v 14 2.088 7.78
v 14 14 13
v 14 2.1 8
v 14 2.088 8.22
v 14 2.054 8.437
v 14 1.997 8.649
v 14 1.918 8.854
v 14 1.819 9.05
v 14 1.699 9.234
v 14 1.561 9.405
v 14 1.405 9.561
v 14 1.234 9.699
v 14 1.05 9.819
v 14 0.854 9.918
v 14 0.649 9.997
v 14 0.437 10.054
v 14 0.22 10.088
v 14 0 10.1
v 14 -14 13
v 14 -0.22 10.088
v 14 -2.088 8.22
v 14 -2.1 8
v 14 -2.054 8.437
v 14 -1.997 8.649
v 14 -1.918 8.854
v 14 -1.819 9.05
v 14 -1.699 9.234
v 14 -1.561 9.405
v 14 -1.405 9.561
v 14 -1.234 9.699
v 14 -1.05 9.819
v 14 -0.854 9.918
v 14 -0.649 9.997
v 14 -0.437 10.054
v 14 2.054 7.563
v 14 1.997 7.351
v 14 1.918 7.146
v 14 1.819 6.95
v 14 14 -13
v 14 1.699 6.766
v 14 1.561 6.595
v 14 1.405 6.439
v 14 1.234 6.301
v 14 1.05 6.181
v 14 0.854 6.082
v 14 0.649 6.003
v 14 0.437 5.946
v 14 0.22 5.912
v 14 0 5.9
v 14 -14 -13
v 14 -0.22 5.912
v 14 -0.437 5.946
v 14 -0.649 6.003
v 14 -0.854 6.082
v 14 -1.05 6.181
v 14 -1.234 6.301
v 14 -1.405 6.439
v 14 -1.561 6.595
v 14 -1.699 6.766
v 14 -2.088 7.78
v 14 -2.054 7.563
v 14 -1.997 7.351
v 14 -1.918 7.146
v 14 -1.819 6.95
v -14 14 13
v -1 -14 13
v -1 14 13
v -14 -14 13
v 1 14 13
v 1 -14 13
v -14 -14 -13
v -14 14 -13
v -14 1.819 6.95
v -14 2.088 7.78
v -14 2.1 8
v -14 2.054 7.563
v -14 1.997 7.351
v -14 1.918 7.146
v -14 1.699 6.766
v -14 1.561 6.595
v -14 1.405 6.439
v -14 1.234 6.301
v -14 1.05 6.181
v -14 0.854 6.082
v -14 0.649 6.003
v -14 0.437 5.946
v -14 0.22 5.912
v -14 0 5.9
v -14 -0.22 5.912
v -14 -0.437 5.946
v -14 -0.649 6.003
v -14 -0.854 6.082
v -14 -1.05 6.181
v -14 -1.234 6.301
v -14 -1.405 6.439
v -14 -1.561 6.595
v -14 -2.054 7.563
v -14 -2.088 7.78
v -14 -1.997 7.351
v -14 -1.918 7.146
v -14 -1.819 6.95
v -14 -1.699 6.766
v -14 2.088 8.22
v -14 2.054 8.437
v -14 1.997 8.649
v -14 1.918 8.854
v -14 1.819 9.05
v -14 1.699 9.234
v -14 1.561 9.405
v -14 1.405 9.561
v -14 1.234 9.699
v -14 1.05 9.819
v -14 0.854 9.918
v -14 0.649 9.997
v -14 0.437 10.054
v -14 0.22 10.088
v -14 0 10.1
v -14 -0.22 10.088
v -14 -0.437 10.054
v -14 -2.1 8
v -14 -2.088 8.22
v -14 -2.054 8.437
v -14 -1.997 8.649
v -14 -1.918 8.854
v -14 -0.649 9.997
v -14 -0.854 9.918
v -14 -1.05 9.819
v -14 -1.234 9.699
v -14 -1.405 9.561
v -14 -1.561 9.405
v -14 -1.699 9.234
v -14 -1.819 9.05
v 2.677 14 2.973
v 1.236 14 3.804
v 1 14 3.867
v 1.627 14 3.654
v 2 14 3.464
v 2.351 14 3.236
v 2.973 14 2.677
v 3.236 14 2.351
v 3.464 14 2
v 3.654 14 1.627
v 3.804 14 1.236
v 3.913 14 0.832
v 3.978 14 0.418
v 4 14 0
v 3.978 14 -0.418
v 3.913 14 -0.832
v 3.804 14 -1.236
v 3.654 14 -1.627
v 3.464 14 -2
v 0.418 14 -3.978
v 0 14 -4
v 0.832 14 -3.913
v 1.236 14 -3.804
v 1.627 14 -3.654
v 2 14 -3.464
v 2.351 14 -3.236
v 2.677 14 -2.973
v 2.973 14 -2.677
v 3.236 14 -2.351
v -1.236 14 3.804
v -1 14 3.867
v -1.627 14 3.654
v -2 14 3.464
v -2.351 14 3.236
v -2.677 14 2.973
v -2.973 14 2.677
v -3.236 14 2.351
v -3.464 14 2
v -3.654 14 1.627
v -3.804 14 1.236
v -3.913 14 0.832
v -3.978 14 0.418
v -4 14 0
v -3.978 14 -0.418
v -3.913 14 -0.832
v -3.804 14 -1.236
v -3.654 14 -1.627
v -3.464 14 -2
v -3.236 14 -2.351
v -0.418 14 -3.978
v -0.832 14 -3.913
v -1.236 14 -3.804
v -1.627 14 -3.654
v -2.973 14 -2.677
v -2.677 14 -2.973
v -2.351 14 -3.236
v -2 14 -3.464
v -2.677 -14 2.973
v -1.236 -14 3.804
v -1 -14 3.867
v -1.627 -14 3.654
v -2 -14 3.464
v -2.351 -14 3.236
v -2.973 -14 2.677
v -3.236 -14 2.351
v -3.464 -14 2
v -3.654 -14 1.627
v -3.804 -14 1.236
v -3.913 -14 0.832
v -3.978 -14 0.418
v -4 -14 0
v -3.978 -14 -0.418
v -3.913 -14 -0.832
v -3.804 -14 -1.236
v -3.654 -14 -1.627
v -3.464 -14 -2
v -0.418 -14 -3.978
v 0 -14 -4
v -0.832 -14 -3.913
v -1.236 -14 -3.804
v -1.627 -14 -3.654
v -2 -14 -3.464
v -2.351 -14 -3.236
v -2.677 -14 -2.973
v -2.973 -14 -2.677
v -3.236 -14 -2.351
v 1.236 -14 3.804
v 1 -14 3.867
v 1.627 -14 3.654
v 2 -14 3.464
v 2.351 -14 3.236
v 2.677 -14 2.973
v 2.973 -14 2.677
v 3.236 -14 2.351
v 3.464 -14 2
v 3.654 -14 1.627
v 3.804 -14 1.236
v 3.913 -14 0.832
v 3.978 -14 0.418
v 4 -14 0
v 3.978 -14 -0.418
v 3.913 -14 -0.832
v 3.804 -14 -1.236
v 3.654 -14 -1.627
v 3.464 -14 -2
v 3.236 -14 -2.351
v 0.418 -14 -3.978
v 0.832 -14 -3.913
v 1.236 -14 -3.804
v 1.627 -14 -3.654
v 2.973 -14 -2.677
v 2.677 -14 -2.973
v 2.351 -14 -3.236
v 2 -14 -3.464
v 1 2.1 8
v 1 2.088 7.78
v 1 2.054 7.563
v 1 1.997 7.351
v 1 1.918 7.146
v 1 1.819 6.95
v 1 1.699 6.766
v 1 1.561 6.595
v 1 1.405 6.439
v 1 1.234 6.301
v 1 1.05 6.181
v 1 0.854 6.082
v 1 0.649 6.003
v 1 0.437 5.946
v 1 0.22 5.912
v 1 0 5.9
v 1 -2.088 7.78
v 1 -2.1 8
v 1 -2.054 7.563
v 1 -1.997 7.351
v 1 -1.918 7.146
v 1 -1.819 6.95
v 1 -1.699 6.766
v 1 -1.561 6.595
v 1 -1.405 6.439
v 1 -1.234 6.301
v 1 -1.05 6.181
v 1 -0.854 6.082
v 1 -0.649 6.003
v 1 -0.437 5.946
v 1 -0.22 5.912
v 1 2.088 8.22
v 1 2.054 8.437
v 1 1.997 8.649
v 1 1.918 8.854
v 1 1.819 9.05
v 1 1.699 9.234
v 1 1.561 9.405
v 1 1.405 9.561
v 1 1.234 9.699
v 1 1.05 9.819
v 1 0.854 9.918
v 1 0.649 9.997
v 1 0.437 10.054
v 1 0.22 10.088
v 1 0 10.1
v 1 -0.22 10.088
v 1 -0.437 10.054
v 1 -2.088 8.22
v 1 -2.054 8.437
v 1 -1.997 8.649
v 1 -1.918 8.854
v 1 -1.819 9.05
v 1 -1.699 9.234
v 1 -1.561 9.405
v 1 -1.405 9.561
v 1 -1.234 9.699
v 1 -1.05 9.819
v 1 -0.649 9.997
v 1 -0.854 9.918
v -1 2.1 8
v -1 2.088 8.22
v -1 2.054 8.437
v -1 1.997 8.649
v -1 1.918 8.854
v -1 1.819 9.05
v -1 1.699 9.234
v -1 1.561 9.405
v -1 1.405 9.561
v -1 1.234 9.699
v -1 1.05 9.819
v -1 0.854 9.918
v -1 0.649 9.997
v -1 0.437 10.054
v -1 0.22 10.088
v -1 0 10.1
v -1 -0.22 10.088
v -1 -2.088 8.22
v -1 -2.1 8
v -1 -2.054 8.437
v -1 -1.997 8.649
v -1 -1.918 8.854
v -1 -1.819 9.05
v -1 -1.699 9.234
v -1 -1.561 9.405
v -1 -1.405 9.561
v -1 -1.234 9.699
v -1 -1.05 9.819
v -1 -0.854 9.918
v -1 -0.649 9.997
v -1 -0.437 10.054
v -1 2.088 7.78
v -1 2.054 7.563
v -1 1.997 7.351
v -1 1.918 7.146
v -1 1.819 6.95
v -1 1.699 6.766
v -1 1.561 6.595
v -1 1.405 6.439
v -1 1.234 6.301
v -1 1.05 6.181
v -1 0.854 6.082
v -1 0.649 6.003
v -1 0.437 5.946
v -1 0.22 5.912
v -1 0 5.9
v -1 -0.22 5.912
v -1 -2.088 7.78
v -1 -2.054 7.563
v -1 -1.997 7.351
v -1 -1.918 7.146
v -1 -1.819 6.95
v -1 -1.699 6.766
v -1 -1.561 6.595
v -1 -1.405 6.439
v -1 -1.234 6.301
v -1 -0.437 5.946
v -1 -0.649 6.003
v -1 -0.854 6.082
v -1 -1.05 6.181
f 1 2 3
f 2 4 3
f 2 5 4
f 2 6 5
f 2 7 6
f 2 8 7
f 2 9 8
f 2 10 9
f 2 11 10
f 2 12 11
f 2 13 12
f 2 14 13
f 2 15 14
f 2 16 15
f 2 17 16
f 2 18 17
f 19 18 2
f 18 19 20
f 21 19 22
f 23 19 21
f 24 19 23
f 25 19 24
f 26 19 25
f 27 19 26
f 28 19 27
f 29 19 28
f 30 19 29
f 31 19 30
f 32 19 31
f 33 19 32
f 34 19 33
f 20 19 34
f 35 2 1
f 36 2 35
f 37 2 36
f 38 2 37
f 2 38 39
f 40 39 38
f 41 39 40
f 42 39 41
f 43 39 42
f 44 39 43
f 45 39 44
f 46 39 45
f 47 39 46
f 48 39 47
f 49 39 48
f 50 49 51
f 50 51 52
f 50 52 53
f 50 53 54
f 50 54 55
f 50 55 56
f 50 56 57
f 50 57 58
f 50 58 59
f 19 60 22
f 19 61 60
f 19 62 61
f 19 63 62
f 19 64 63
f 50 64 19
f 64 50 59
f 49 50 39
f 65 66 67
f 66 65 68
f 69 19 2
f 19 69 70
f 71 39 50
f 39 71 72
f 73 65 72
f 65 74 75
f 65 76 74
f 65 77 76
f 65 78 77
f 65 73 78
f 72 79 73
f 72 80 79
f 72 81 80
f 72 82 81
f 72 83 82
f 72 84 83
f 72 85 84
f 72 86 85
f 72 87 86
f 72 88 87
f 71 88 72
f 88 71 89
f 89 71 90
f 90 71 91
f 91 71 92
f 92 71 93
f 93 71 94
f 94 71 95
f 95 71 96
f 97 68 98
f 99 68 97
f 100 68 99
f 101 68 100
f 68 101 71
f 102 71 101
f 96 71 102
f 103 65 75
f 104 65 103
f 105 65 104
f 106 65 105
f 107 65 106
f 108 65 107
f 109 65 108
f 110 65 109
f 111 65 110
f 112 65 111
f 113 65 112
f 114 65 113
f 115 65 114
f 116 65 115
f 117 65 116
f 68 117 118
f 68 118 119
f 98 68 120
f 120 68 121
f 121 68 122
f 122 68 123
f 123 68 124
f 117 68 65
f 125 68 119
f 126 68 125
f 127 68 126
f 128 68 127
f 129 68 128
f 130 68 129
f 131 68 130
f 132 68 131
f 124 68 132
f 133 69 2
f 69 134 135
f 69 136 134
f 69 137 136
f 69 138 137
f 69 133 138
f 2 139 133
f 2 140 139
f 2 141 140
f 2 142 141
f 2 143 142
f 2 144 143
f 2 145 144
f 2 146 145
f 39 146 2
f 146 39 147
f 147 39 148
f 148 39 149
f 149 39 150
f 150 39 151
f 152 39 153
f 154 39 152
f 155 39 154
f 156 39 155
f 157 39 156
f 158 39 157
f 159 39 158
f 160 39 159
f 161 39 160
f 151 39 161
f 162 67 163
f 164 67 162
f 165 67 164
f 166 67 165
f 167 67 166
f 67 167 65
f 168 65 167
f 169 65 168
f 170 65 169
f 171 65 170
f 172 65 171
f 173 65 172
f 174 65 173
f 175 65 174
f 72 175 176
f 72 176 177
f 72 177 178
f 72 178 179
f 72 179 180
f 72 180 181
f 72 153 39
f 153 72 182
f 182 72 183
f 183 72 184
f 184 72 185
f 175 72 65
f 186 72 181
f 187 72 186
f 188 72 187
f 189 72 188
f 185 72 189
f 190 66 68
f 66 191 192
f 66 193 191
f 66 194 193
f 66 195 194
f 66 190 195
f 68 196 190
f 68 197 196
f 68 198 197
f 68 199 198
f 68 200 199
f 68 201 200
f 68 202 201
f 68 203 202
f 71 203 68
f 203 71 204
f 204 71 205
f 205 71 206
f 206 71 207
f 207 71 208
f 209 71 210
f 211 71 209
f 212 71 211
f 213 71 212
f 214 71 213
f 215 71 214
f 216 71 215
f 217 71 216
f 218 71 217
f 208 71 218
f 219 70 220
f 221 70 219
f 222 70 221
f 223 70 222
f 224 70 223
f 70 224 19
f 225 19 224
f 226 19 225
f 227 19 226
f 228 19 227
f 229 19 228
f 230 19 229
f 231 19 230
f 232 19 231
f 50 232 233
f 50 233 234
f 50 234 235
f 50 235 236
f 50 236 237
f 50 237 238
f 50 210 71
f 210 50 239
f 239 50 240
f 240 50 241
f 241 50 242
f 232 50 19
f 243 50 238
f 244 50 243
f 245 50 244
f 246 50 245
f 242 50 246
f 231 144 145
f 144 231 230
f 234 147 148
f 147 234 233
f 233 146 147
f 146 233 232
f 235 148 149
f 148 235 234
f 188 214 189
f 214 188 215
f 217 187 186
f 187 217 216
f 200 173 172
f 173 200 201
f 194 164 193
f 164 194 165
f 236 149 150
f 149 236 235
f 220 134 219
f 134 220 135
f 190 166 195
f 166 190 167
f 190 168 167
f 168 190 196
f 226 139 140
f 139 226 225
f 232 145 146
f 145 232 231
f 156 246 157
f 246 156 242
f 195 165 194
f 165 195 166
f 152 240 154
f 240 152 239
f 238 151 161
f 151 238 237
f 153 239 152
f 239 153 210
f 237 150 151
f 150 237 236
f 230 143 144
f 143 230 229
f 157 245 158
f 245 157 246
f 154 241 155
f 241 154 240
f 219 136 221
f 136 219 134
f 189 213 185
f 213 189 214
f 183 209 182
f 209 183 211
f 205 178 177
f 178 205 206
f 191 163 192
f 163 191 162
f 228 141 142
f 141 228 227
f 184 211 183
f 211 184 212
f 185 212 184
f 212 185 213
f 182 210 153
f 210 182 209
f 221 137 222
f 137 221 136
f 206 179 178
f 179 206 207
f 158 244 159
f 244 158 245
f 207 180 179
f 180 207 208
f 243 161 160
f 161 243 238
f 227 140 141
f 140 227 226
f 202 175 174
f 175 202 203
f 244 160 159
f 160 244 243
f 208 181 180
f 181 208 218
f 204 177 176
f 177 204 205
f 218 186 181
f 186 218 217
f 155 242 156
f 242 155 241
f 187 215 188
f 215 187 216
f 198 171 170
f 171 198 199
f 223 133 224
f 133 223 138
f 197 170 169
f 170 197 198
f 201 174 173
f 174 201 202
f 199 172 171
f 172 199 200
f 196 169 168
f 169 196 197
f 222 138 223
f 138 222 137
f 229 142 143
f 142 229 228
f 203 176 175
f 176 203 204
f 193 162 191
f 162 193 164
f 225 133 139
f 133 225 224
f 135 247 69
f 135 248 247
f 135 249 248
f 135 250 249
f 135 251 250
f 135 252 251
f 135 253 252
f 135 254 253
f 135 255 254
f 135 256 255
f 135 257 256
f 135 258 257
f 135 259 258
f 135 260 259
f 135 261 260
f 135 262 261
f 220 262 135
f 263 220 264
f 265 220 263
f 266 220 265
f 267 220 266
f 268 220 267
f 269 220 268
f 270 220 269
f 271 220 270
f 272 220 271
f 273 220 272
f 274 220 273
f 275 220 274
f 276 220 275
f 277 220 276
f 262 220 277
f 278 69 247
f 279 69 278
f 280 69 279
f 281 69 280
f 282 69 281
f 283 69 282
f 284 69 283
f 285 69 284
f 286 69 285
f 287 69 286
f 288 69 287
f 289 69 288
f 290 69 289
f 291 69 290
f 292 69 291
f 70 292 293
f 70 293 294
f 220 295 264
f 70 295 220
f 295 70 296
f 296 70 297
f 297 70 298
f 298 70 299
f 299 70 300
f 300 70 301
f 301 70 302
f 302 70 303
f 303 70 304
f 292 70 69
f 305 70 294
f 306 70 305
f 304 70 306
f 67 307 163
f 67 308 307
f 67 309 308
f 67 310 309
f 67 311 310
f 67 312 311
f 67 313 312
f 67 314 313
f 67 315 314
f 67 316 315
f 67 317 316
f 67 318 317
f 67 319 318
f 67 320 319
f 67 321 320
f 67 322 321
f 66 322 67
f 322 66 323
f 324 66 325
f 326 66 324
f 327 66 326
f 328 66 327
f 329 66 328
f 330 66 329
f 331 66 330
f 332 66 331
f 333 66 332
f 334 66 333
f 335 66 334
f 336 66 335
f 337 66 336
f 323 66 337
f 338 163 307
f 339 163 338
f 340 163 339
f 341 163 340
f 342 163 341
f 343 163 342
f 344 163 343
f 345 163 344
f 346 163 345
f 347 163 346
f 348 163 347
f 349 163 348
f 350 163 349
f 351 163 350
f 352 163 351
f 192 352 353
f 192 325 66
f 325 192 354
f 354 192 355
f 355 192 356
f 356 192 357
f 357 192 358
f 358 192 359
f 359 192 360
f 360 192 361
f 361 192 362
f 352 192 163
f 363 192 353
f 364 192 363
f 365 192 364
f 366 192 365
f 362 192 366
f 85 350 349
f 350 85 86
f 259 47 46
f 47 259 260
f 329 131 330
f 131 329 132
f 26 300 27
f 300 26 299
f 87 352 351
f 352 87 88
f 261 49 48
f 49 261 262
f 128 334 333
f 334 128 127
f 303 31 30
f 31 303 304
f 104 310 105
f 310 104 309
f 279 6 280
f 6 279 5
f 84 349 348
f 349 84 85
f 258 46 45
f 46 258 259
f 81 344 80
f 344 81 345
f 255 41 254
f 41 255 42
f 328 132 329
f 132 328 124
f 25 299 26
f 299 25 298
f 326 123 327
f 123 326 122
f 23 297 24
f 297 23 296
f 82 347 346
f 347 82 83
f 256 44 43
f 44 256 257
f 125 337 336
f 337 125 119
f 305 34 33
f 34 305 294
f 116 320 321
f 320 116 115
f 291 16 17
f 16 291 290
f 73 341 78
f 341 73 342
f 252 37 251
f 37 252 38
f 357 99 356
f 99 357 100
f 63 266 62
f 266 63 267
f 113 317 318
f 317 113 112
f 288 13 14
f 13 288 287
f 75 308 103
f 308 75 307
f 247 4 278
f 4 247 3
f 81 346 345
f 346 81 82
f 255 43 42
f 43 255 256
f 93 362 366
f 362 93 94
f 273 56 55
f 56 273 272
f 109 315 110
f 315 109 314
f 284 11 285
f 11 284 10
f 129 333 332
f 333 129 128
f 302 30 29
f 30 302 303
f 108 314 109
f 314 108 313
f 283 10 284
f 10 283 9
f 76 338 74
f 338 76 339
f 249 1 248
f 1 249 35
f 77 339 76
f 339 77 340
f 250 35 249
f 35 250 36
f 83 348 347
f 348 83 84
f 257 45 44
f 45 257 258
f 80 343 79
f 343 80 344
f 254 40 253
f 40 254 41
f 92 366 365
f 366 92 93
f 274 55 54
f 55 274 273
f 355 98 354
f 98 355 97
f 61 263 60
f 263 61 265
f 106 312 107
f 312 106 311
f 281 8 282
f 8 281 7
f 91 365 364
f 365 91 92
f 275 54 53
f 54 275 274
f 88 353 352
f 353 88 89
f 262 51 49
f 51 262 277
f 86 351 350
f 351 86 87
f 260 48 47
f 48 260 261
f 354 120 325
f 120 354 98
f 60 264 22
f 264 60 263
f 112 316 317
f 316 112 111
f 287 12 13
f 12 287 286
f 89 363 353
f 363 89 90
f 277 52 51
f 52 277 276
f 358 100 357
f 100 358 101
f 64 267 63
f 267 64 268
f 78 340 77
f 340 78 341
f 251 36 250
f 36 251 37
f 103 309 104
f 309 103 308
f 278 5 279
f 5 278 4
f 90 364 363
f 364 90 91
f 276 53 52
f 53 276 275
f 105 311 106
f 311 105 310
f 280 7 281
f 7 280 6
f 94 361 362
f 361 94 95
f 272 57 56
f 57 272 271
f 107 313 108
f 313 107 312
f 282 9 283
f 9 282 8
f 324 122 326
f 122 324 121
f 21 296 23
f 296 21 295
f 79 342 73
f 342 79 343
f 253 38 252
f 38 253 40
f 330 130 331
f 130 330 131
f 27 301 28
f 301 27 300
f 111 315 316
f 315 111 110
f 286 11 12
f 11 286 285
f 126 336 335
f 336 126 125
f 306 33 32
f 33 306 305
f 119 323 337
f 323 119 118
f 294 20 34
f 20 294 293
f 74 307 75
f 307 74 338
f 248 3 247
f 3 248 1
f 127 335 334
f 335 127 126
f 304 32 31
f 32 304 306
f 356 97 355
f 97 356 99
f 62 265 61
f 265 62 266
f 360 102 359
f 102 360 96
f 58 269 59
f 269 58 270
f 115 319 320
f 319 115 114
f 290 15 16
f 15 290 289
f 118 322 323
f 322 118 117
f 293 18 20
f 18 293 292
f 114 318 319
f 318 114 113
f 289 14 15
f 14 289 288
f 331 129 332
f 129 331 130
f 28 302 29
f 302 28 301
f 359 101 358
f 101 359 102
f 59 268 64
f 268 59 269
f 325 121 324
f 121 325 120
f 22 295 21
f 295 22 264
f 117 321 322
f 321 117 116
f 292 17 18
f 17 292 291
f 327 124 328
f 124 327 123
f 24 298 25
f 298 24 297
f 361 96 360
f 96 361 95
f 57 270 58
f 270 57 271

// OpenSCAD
// Split clamp block.
$fn = 60;
eps = 0.02;
bore_d = 8;
body_w = 28;
body_h = 26;
body_l = 28;
slot_w = 2;
difference() {
    cube([body_l, body_w, body_h], center = true);
    translate([0, -body_w / 2 - eps, 0]) rotate([-90,0,0]) cylinder(d = bore_d, h = body_w + 2 * eps);
    translate([-slot_w / 2, -body_w / 2 - eps, 0]) cube([slot_w, body_w + 2 * eps, body_h / 2 + eps]);
    translate([-body_l / 2 - eps, 0, body_h / 2 - 5]) rotate([0,90,0]) cylinder(d = 4.2, h = body_l + 2 * eps);
}
